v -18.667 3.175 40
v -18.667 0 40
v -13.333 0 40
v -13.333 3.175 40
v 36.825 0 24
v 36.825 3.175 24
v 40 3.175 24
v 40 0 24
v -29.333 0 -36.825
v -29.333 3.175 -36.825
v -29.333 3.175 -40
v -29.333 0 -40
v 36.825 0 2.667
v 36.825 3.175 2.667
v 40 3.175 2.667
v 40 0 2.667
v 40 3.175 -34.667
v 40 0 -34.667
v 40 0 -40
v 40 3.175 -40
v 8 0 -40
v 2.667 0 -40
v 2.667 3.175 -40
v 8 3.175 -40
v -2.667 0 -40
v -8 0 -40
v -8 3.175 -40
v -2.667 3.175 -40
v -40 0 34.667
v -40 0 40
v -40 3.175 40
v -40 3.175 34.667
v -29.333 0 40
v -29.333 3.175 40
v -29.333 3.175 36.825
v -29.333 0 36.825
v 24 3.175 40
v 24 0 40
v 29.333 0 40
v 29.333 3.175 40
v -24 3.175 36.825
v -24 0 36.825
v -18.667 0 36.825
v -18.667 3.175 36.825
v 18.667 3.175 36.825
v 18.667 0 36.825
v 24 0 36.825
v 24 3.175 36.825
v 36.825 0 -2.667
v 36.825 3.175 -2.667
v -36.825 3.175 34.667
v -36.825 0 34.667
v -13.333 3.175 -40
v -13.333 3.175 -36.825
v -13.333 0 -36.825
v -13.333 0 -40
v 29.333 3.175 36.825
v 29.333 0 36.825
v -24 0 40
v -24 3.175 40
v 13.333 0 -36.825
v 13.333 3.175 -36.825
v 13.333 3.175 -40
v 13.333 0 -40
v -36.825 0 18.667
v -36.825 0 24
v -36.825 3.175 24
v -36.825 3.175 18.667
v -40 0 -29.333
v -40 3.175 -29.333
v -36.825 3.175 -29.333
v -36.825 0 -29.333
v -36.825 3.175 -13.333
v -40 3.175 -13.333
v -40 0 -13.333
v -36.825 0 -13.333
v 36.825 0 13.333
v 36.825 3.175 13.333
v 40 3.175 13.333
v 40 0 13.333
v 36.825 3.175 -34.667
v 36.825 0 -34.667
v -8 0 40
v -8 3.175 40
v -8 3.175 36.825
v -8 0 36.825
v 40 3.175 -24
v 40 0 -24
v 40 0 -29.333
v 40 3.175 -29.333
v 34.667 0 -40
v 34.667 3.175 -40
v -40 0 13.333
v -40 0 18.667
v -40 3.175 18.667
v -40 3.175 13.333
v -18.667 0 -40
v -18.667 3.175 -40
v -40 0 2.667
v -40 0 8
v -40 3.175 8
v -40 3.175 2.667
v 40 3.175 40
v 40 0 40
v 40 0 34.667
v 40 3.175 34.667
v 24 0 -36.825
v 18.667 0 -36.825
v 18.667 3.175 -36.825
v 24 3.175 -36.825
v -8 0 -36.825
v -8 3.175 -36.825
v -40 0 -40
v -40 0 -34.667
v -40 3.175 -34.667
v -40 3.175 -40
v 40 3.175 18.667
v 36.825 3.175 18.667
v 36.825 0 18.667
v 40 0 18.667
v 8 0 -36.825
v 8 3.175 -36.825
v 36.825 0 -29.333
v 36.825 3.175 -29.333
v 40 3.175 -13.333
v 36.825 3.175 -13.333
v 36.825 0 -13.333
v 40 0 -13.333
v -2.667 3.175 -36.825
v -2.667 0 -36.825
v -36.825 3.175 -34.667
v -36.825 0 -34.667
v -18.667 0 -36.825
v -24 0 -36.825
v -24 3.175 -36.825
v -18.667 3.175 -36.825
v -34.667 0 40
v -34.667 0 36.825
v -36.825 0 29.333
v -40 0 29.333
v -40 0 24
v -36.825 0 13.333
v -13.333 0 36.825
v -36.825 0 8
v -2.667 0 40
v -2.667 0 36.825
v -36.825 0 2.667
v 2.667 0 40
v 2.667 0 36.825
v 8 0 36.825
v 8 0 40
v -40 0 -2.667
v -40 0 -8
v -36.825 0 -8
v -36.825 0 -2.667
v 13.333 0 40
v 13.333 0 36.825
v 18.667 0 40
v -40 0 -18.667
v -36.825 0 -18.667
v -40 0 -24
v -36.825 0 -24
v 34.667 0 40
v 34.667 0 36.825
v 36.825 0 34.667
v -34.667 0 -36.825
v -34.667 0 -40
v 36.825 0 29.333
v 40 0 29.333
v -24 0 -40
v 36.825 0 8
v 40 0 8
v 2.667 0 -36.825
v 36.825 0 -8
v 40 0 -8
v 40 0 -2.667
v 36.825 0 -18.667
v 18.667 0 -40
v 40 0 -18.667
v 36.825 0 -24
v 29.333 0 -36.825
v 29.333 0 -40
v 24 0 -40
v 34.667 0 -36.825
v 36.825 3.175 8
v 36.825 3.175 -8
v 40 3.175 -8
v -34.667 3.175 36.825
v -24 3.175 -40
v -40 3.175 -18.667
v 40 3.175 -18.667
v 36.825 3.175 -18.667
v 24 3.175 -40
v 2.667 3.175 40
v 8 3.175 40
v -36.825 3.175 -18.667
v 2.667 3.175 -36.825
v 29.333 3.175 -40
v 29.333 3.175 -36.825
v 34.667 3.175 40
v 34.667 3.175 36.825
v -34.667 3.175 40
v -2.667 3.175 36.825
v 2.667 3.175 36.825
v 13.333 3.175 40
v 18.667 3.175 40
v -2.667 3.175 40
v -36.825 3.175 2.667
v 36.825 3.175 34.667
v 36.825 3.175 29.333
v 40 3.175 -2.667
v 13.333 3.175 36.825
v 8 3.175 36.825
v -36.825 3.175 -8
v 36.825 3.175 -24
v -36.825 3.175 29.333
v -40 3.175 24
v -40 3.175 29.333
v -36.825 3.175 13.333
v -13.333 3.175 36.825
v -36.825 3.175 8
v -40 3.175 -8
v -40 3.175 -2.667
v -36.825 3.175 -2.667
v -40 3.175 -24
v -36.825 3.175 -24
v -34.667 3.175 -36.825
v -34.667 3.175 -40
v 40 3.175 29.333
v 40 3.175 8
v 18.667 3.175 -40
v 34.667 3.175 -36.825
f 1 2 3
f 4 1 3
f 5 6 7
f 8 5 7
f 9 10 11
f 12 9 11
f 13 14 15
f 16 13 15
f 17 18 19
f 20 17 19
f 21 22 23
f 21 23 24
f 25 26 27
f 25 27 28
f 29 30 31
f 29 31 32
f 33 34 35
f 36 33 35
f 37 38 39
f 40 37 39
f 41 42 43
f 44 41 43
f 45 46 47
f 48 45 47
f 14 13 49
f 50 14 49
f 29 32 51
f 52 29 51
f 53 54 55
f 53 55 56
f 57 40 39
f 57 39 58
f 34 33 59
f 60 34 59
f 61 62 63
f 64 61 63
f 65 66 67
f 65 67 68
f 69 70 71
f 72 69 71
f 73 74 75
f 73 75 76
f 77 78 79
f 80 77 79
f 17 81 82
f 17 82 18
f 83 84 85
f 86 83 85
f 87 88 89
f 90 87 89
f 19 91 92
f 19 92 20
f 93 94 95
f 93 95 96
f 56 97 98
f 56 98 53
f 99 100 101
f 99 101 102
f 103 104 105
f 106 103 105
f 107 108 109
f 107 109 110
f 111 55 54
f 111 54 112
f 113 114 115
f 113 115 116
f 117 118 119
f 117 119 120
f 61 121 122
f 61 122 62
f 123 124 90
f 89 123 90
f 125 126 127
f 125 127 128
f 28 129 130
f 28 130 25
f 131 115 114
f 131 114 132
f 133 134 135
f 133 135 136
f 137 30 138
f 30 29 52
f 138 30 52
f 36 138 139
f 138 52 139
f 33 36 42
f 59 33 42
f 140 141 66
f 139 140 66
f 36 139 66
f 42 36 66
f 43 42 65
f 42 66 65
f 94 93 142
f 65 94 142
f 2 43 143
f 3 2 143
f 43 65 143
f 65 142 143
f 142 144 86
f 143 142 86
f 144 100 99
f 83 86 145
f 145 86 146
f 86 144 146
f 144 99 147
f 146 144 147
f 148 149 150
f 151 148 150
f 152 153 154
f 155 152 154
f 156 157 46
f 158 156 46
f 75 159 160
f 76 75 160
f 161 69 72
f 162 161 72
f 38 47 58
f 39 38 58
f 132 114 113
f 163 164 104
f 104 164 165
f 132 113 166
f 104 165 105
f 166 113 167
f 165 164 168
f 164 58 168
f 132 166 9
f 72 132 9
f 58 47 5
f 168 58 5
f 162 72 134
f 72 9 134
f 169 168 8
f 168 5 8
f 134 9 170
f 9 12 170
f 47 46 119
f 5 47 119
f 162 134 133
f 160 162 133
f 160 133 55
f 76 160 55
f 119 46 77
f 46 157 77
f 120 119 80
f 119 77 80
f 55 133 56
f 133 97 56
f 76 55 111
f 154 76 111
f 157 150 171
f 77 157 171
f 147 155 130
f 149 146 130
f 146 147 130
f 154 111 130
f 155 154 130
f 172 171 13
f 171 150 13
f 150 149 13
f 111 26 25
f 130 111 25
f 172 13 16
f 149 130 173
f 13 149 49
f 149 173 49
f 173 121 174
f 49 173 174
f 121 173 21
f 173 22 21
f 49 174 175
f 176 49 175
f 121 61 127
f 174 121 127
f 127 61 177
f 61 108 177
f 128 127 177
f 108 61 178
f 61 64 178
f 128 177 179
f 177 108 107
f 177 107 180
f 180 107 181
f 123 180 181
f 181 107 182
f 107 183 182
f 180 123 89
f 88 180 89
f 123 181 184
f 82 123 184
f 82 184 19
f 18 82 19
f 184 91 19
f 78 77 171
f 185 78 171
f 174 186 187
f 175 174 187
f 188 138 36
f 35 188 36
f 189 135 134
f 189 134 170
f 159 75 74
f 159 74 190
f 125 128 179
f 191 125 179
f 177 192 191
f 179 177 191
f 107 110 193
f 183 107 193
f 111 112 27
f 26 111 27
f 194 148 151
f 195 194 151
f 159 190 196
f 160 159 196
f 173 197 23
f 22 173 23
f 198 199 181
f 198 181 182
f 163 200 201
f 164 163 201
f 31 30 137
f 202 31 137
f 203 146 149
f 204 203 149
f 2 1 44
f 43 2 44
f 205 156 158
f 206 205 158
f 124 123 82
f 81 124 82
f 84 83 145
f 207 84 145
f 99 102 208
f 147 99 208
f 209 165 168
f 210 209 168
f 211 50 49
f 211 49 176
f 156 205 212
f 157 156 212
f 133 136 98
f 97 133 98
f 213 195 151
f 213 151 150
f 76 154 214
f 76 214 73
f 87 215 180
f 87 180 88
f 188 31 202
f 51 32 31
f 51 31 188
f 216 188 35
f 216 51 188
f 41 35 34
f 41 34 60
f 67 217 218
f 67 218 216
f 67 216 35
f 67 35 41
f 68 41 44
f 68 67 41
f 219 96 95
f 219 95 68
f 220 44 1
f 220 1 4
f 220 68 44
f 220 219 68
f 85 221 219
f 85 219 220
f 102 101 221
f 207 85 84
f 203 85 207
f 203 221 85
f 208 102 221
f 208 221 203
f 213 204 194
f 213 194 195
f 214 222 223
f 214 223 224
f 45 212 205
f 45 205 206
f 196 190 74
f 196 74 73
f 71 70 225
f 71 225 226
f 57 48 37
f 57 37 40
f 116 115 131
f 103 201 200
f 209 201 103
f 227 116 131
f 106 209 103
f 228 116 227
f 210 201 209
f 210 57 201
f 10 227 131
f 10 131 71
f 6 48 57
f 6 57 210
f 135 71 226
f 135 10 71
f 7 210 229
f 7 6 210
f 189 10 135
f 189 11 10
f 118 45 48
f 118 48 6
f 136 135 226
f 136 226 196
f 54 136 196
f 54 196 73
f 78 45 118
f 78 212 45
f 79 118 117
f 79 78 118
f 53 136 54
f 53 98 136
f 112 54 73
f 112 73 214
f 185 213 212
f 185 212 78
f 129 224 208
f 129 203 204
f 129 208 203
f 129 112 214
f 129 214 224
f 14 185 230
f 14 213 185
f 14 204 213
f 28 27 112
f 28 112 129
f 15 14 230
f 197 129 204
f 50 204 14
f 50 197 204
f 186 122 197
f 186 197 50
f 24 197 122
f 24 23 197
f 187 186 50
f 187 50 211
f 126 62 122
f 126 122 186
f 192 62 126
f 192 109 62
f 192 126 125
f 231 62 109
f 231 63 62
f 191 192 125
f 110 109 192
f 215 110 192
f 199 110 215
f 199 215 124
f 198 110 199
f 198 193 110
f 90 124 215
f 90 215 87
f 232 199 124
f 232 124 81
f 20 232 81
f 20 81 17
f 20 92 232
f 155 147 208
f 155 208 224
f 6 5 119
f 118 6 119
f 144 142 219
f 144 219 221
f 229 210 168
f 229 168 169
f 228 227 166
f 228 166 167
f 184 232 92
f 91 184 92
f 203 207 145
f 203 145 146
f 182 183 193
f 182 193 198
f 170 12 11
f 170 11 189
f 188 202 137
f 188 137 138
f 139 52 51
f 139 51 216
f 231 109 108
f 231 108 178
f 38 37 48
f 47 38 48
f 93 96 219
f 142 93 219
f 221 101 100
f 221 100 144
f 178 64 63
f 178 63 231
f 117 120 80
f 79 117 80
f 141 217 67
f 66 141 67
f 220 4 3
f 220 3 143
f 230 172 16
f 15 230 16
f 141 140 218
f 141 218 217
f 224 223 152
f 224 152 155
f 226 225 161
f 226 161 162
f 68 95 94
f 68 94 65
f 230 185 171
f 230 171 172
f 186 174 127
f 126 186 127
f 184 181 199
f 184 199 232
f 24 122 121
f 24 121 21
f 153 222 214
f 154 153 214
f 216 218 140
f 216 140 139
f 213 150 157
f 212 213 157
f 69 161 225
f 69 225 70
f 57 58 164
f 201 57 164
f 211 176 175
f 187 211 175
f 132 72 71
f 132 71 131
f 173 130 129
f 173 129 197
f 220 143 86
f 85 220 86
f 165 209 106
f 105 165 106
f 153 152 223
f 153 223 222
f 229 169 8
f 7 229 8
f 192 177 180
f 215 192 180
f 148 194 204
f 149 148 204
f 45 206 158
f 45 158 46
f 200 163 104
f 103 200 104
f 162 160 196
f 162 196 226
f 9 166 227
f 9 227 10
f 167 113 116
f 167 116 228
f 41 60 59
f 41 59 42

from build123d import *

# Parameters (mm, degrees)
SKETCH1_W           = 80
SKETCH1_H           = 80
BOSS_EXTRUDE1_DEPTH = 3.175
SKETCH2_OUTSIDE_W   = 104.636
SKETCH2_OUTSIDE_H   = 104.636
CUT_EXTRUDE3_DEPTH  = 57.657573413


with BuildPart() as part:
    # Sketch1 → Boss-Extrude1 (new body)
    with BuildSketch(Plane(origin=(0, 0, 0), x_dir=(1, 0, 0), z_dir=(0, 1, 0))):
        Rectangle(SKETCH1_W, SKETCH1_H)
    extrude(amount=BOSS_EXTRUDE1_DEPTH)

    # Sketch2 outside → Cut-Extrude3 (cut, through all)
    with BuildSketch(Plane(origin=(0, 3.175, 0), x_dir=(1, 0, 0), z_dir=(0, 1, 0))):
        Rectangle(SKETCH2_OUTSIDE_W, SKETCH2_OUTSIDE_H)
        Polygon((-40, -40), (-34.666666667, -40), (-34.666666667, -36.825), (-29.333333333, -36.825), (-29.333333333, -40), (-24, -40), (-24, -36.825), (-18.666666667, -36.825), (-18.666666667, -40), (-13.333333333, -40), (-13.333333333, -36.825), (-8, -36.825), (-8, -40), (-2.666666667, -40), (-2.666666667, -36.825), (2.666666667, -36.825), (2.666666667, -40), (8, -40), (8, -36.825), (13.333333333, -36.825), (13.333333333, -40), (18.666666667, -40), (18.666666667, -36.825), (24, -36.825), (24, -40), (29.333333333, -40), (29.333333333, -36.825), (34.666666667, -36.825), (34.666666667, -40), (40, -40), (40, -34.666666667), (36.825, -34.666666667), (36.825, -29.333333333), (40, -29.333333333), (40, -24), (36.825, -24), (36.825, -18.666666667), (40, -18.666666667), (40, -13.333333333), (36.825, -13.333333333), (36.825, -8), (40, -8), (40, -2.666666667), (36.825, -2.666666667), (36.825, 2.666666667), (40, 2.666666667), (40, 8), (36.825, 8), (36.825, 13.333333333), (40, 13.333333333), (40, 18.666666667), (36.825, 18.666666667), (36.825, 24), (40, 24), (40, 29.333333333), (36.825, 29.333333333), (36.825, 34.666666667), (40, 34.666666667), (40, 40), (34.666666667, 40), (34.666666667, 36.825), (29.333333333, 36.825), (29.333333333, 40), (24, 40), (24, 36.825), (18.666666667, 36.825), (18.666666667, 40), (13.333333333, 40), (13.333333333, 36.825), (8, 36.825), (8, 40), (2.666666667, 40), (2.666666667, 36.825), (-2.666666667, 36.825), (-2.666666667, 40), (-8, 40), (-8, 36.825), (-13.333333333, 36.825), (-13.333333333, 40), (-18.666666667, 40), (-18.666666667, 36.825), (-24, 36.825), (-24, 40), (-29.333333333, 40), (-29.333333333, 36.825), (-34.666666667, 36.825), (-34.666666667, 40), (-40, 40), (-40, 34.666666667), (-36.825, 34.666666667), (-36.825, 29.333333333), (-40, 29.333333333), (-40, 24), (-36.825, 24), (-36.825, 18.666666667), (-40, 18.666666667), (-40, 13.333333333), (-36.825, 13.333333333), (-36.825, 8), (-40, 8), (-40, 2.666666667), (-36.825, 2.666666667), (-36.825, -2.666666667), (-40, -2.666666667), (-40, -8), (-36.825, -8), (-36.825, -13.333333333), (-40, -13.333333333), (-40, -18.666666667), (-36.825, -18.666666667), (-36.825, -24), (-40, -24), (-40, -29.333333333), (-36.825, -29.333333333), (-36.825, -34.666666667), (-40, -34.666666667), align=None, mode=Mode.SUBTRACT)
    extrude(amount=-CUT_EXTRUDE3_DEPTH, mode=Mode.SUBTRACT)


solid = part.part
